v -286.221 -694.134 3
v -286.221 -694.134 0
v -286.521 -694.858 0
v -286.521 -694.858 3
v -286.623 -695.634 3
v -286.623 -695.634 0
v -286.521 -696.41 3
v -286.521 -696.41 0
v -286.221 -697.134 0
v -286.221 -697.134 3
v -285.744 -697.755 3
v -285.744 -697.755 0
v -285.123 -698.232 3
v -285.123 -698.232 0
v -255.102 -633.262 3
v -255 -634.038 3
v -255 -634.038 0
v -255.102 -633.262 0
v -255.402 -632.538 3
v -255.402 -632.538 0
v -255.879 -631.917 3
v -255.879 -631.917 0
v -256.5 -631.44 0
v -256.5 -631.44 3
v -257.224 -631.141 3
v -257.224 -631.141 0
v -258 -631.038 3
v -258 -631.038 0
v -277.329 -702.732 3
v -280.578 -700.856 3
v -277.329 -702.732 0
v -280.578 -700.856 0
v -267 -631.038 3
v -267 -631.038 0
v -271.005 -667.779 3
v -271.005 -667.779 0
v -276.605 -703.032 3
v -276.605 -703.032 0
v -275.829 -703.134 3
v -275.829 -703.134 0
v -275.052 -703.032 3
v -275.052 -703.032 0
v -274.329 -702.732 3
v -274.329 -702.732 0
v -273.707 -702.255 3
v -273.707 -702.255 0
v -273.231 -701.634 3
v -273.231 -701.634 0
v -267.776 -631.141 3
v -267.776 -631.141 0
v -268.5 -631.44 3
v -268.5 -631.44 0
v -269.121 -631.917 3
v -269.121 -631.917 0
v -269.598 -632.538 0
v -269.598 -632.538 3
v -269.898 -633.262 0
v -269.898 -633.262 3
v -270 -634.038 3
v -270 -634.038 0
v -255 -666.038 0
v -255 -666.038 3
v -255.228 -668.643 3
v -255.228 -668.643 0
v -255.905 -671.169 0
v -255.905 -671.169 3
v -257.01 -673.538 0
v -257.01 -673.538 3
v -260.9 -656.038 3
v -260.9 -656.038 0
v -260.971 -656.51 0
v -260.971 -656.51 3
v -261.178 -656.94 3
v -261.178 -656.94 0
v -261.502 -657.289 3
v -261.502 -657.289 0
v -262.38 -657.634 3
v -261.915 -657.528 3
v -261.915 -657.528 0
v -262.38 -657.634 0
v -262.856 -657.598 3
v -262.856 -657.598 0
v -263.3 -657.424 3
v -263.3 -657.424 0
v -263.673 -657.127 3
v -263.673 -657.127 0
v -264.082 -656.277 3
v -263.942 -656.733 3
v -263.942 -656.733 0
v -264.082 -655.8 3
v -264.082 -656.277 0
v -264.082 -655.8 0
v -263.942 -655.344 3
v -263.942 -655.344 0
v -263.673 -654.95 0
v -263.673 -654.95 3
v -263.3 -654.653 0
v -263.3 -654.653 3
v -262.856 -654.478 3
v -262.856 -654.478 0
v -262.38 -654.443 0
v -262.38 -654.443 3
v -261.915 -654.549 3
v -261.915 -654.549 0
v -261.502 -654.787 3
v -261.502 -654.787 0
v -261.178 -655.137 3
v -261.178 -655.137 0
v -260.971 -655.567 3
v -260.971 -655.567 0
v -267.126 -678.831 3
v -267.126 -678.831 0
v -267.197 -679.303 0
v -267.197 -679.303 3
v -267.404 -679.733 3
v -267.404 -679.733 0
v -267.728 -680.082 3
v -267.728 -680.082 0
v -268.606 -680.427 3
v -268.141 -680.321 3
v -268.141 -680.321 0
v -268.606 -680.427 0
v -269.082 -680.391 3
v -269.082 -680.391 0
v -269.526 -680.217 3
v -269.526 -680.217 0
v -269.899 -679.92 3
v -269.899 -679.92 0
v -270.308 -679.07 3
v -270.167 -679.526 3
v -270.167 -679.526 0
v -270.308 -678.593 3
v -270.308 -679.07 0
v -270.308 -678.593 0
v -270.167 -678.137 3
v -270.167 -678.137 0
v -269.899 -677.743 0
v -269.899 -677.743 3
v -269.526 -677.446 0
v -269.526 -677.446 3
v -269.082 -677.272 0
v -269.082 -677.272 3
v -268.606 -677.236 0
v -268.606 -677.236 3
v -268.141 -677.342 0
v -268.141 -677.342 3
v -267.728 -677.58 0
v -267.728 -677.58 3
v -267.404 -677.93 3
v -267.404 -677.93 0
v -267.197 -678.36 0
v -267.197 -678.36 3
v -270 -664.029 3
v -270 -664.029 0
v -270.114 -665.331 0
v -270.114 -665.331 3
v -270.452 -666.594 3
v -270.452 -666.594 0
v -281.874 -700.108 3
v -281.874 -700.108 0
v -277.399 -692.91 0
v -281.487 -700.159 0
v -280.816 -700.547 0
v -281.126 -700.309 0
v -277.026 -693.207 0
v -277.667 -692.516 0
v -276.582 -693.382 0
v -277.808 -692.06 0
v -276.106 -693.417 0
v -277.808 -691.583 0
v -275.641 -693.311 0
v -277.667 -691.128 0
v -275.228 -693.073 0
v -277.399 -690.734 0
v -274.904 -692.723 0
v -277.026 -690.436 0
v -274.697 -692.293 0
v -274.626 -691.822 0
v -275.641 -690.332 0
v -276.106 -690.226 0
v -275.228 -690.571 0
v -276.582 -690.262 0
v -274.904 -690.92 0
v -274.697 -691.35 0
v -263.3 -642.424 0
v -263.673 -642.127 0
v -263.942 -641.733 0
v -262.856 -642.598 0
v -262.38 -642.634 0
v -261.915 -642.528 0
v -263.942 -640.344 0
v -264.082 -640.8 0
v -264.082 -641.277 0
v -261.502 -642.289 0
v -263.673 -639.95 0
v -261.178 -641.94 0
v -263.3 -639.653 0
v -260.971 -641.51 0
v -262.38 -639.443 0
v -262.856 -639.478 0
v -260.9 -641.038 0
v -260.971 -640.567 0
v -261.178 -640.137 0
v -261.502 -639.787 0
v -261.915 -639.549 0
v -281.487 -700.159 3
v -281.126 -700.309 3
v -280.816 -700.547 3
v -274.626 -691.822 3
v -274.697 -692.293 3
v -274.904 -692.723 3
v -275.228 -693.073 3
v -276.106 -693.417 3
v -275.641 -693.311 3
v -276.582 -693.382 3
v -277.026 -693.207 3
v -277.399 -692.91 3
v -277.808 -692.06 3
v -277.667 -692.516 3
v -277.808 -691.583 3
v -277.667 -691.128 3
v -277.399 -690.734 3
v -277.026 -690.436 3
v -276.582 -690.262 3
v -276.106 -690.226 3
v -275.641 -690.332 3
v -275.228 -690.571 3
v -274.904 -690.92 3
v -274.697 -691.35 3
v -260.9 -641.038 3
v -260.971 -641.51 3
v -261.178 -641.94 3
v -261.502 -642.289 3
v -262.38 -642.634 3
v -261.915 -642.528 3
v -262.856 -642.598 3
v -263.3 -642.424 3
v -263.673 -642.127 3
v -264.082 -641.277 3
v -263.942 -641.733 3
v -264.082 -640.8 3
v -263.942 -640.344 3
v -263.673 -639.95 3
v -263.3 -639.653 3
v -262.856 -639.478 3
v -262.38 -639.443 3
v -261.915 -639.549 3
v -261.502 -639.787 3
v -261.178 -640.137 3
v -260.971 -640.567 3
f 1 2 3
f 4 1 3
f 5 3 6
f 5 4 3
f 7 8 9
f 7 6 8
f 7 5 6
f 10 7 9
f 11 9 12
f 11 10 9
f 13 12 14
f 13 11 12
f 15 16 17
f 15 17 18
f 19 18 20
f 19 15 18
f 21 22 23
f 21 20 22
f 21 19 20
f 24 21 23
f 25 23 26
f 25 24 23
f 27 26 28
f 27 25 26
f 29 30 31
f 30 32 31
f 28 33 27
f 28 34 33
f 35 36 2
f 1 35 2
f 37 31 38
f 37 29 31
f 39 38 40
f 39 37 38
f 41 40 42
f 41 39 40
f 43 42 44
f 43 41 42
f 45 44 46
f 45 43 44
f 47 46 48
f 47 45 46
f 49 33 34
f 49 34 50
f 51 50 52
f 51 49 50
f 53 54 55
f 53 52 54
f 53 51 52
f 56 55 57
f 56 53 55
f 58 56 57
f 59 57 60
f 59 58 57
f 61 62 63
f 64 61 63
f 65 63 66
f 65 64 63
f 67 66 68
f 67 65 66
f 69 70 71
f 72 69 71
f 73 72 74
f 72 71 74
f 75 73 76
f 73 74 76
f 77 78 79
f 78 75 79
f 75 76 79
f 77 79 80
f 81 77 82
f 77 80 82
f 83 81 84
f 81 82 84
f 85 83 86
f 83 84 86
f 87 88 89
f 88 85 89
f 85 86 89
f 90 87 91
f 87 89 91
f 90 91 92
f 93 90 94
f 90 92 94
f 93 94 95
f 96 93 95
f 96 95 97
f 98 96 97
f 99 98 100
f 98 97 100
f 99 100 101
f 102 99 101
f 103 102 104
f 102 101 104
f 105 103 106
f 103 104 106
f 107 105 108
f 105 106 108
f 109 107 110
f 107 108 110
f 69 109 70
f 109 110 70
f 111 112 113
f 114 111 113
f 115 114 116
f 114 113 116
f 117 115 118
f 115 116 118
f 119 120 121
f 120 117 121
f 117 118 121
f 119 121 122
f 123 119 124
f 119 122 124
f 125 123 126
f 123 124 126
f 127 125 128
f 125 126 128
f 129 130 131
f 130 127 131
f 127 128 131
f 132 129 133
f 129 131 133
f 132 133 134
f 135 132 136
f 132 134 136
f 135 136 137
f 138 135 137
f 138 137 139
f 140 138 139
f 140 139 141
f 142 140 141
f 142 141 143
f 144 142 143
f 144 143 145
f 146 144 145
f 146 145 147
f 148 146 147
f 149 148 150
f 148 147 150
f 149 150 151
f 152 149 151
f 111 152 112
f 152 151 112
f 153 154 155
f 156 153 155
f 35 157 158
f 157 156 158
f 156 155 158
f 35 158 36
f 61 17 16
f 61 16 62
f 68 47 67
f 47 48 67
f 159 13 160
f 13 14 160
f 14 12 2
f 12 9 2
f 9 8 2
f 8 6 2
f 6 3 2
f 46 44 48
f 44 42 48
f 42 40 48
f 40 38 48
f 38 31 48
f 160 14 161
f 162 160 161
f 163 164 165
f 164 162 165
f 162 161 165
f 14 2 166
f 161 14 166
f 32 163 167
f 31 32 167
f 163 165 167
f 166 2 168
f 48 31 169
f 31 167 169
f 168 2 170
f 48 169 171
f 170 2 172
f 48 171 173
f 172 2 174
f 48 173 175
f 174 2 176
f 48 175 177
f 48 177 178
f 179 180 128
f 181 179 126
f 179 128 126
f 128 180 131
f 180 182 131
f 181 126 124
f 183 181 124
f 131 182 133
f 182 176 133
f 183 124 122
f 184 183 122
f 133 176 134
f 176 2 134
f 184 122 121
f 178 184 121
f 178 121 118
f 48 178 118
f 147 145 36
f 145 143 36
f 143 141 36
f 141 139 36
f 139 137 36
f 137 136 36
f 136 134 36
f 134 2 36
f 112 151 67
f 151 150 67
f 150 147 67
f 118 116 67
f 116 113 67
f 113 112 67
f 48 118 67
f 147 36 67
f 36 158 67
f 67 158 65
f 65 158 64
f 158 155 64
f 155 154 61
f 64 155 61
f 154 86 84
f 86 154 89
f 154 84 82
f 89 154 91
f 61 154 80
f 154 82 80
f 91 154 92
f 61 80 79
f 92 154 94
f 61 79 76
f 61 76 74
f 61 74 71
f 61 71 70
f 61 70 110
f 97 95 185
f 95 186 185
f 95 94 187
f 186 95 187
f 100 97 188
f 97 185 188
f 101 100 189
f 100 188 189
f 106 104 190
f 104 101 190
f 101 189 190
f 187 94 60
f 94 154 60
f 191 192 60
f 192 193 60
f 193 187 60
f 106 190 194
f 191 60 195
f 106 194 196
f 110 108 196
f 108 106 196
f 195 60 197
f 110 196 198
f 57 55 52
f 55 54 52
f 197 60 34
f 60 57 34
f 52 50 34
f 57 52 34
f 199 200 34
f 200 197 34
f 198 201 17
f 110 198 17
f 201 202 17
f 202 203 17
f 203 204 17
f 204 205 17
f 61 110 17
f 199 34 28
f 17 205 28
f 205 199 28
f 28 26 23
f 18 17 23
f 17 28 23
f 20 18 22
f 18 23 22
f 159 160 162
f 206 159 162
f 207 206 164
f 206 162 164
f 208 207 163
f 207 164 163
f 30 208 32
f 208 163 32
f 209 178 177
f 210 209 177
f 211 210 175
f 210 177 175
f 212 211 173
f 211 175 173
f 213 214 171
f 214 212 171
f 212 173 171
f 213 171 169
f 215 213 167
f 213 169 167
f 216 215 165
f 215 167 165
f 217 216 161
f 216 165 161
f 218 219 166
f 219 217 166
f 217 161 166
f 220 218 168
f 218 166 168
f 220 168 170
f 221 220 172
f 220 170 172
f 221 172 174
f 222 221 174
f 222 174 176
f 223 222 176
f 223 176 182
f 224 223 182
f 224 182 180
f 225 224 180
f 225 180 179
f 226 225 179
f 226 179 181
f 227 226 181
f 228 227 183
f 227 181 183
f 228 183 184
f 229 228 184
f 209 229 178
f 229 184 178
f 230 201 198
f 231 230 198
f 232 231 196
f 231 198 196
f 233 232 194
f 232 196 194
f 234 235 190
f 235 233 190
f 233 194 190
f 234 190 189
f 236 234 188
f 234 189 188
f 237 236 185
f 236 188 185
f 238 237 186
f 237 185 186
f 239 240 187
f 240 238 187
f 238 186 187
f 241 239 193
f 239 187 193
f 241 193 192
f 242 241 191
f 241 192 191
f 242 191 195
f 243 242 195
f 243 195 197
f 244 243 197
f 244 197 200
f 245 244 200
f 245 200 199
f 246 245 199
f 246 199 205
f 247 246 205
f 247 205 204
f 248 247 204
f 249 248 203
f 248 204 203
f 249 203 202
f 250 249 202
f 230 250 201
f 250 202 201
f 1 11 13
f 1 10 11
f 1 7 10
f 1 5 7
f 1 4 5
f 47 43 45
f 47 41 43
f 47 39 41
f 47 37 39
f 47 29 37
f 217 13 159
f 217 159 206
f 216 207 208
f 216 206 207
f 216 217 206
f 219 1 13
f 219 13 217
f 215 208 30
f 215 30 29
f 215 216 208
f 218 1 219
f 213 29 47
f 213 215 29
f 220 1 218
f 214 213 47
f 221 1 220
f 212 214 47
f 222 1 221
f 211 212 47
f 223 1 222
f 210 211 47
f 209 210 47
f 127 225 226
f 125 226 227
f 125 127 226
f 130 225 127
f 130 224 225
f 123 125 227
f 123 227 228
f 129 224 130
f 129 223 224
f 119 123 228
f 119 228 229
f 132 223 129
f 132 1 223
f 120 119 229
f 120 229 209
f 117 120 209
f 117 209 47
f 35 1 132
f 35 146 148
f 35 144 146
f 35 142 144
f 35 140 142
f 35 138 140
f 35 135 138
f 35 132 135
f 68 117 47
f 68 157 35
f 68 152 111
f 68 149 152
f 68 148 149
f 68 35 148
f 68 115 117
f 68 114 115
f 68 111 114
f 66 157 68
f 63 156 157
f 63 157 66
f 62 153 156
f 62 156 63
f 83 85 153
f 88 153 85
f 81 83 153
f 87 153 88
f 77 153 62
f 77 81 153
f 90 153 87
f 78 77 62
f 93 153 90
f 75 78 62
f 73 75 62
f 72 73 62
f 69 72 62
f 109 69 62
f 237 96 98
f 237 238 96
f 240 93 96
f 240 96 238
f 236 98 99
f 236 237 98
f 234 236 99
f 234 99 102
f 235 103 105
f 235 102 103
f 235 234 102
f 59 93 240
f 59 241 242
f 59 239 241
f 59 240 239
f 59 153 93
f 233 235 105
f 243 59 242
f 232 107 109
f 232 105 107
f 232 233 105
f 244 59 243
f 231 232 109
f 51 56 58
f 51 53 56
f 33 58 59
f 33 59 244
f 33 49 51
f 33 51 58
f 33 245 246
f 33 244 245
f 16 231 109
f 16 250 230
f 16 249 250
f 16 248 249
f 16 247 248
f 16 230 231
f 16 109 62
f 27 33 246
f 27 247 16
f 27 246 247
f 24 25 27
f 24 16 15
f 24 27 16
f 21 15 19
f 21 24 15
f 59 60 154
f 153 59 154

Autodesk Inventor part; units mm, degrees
ref_plane "YZ Plane" through (0, 0, 0) normal (1, 0, 0) x (0, 1, 0)
ref_plane "XZ Plane" through (0, 0, 0) normal (0, 1, 0) x (-1, 0, 0)
ref_plane "XY Plane" through (0, 0, 0) normal (0, 0, 1) x (1, 0, 0)
sketch "スケッチ1" plane through (0, 0, 0) normal (0, 0, 1) x (1, 0, 0)
  line L0 (67.5, 17.5) -> (-67.5, 17.5) construction
  line L1 (-67.5, 17.5) -> (-67.5, -17.5) construction
  line L2 (-67.5, -17.5) -> (67.5, -17.5) construction
  line L3 (67.5, -17.5) -> (67.5, 17.5) construction
  line L4 (67.5, 17.5) -> (-67.5, -17.5) construction
  line L5 (-67.5, 17.5) -> (67.5, -17.5) construction
  circle A0 centre (-60, 35) radius 1.6 construction
  circle A1 centre (-70, 35) radius 1.6 construction
  line L6 (-77.5, 27.5) -> (-53, 27.5) construction
  line L7 (-53, 27.5) -> (-53, 42.5) construction
  line L8 (-53, 42.5) -> (-80, 42.5) construction
  line L9 (-77.5, 27.5) -> (-77.5, -27.5) construction
  line L10 (-77.5, -27.5) -> (-53, -27.5) construction
  line L11 (-53, -27.5) -> (-53, -42.5) construction
  line L12 (-53, -42.5) -> (-80, -42.5) construction
  circle A2 centre (-60, -35) radius 1.6 construction
  circle A3 centre (-70, -35) radius 1.6 construction
  circle A4 centre (-80, -35) radius 1.6 construction
  line L13 (124.2308, -31.7536) -> (484.5935, -392.1164)
  line L14 (484.5935, -392.1164) -> (488.7129, -553.575)
  line L15 (-80, 21.2868) -> (-468.838, -367.5512) construction
  line L16 (-468.838, -367.5512) -> (-479.4446, -356.9446)
  line L17 (-479.4446, -356.9446) -> (-90.6066, 31.8934) construction
  line L18 (-90.6066, 31.8934) -> (-80, 21.2868) construction
  line L19 (-80, 42.5) -> (-80, 5.3052) construction
  circle A5 centre (-92.3744, 19.519) radius 1.6 construction
  circle A6 centre (-102.981, 8.9124) radius 1.6 construction
  circle A7 centre (-113.5876, -1.6942) radius 1.6 construction
  line L20 (-92.3744, 19.519) -> (-113.5876, -1.6942) construction
  circle A8 centre (-437.941, -345.2067) radius 1.6
  circle A9 centre (-426.1402, -333.4059) radius 1.6
  line L21 (-388.4374, -772.2067) -> (-358.1265, -754.7067) construction
  line L22 (-358.1265, -754.7067) -> (-425.6265, -637.7933) construction
  line L23 (-455.9374, -655.2933) -> (-358.1265, -754.7067) construction
  line L24 (-388.4374, -772.2067) -> (-425.6265, -637.7933) construction
  line L25 (-455.9374, -655.2933) -> (-388.4374, -772.2067) construction
  line L26 (-425.6265, -637.7933) -> (-455.9374, -655.2933) construction
  line L27 (455.9374, -655.2933) -> (425.6265, -637.7933) construction
  line L28 (425.6265, -637.7933) -> (358.1265, -754.7067) construction
  line L29 (388.4374, -772.2067) -> (425.6265, -637.7933) construction
  line L30 (455.9374, -655.2933) -> (358.1265, -754.7067) construction
  line L31 (388.4374, -772.2067) -> (455.9374, -655.2933) construction
  line L32 (358.1265, -754.7067) -> (388.4374, -772.2067) construction
  line L33 (0, 0) -> (0, -263.4473) construction
  circle A10 centre (80, -35) radius 1.6 construction
  line L34 (67.5, 17.5) -> (67.5, -17.5) construction
  line L35 (77.5, 27.5) -> (53, 27.5) construction
  line L36 (77.5, 27.5) -> (77.5, -27.5) construction
  line L37 (77.5, -27.5) -> (53, -27.5) construction
  circle A11 centre (60, -35) radius 1.6 construction
  circle A12 centre (70, -35) radius 1.6 construction
  line L38 (53, -27.5) -> (53, -42.5) construction
  line L39 (53, -42.5) -> (80, -42.5) construction
  circle A13 centre (60, 35) radius 1.6 construction
  circle A14 centre (70, 35) radius 1.6 construction
  line L40 (80, 42.5) -> (80, 5.3052) construction
  line L41 (53, 42.5) -> (80, 42.5) construction
  line L42 (53, 27.5) -> (53, 42.5) construction
  line L43 (-392.0976, -785.867) -> (-404.3476, -764.6493)
  line L44 (-388.4374, -772.2067) -> (-358.1265, -754.7067) construction
  line L45 (-392.0976, -785.867) -> (-344.4662, -758.367)
  circle A15 centre (-336.7211, -756.782) radius 1.6
  circle A16 centre (-341.7211, -748.1218) radius 1.6
  line L46 (-343.7259, -729.6493) -> (-330.2259, -753.032)
  circle A17 centre (-346.7211, -739.4615) radius 1.6
  line L47 (-356.7162, -737.1493) -> (-343.7259, -729.6493)
  line L48 (-344.4662, -758.367) -> (-356.7162, -737.1493)
  circle A18 centre (-407.3428, -774.4615) radius 1.6
  circle A19 centre (-402.3428, -783.1218) radius 1.6
  line L49 (-404.3476, -764.6493) -> (-417.338, -772.1493)
  line L50 (-417.338, -772.1493) -> (-405.4634, -792.7168)
  line L51 (-403.838, -795.532) -> (-371.6264, -776.9346) construction
  line L52 (-425.6265, -637.7933) -> (-455.9374, -655.2933) construction
  line L53 (-409.7162, -645.3507) -> (-396.7259, -637.8507)
  circle A20 centre (-406.7211, -635.5385) radius 1.6
  line L54 (-455.9374, -655.2933) -> (-425.6265, -637.7933) construction
  circle A21 centre (-411.7211, -626.8782) radius 1.6
  line L55 (-469.5976, -651.633) -> (-421.9662, -624.133)
  line L56 (-421.9662, -624.133) -> (-409.7162, -645.3507)
  line L57 (-396.7259, -637.8507) -> (-410.2259, -614.468)
  circle A22 centre (-416.7211, -618.218) radius 1.6
  line L58 (-469.5976, -651.633) -> (-457.3476, -672.8507)
  circle A23 centre (-467.3428, -670.5385) radius 1.6
  circle A24 centre (-472.3428, -661.8782) radius 1.6
  line L59 (-483.838, -656.968) -> (-451.6264, -638.3706) construction
  line L60 (-470.338, -680.3507) -> (-483.838, -656.968)
  line L61 (-457.3476, -672.8507) -> (-470.338, -680.3507)
  line L62 (469.5976, -651.633) -> (457.3476, -672.8507)
  line L63 (455.9374, -655.2933) -> (425.6265, -637.7933) construction
  line L64 (469.5976, -651.633) -> (421.9662, -624.133)
  circle A25 centre (416.7211, -618.218) radius 1.6
  circle A26 centre (411.7211, -626.8782) radius 1.6
  line L65 (396.7259, -637.8507) -> (410.2259, -614.468)
  circle A27 centre (406.7211, -635.5385) radius 1.6
  line L66 (409.7162, -645.3507) -> (396.7259, -637.8507)
  line L67 (421.9662, -624.133) -> (409.7162, -645.3507)
  circle A28 centre (467.3428, -670.5385) radius 1.6
  circle A29 centre (472.3428, -661.8782) radius 1.6
  line L68 (457.3476, -672.8507) -> (470.338, -680.3507)
  line L69 (470.338, -680.3507) -> (483.838, -656.968)
  line L70 (483.838, -656.968) -> (451.6264, -638.3706) construction
  line L71 (358.1265, -754.7067) -> (388.4374, -772.2067) construction
  line L72 (356.7162, -737.1493) -> (343.7259, -729.6493)
  circle A30 centre (346.7211, -739.4615) radius 1.6
  line L73 (388.4374, -772.2067) -> (358.1265, -754.7067) construction
  circle A31 centre (341.7211, -748.1218) radius 1.6
  line L74 (392.0976, -785.867) -> (344.4662, -758.367)
  line L75 (344.4662, -758.367) -> (356.7162, -737.1493)
  line L76 (343.7259, -729.6493) -> (330.2259, -753.032)
  circle A32 centre (336.7211, -756.782) radius 1.6
  line L77 (392.0976, -785.867) -> (404.3476, -764.6493)
  circle A33 centre (407.3428, -774.4615) radius 1.6
  circle A34 centre (402.3428, -783.1218) radius 1.6
  line L78 (403.838, -795.532) -> (371.6264, -776.9346) construction
  line L79 (417.338, -772.1493) -> (403.838, -795.532)
  line L80 (404.3476, -764.6493) -> (417.338, -772.1493)
  line L81 (-483.838, -367.5512) -> (-468.838, -367.5512)
  line L82 (-468.838, -367.5512) -> (-468.838, -648.3077) construction
  line L83 (-468.838, -648.3077) -> (-483.838, -648.3077) construction
  line L84 (-483.838, -648.3077) -> (-483.838, -367.5512) construction
  line L85 (-283.2277, -604.4352) -> (-262.2277, -640.8083) construction
  line L86 (345.2492, -497.0108) -> (305.7786, -565.3759) construction
  line L87 (250, -655.004) -> (-250, -655.004) construction
  line L88 (-250, -655.004) -> (-250, -1155.004) construction
  line L89 (-250, -1155.004) -> (250, -1155.004) construction
  line L90 (250, -1155.004) -> (250, -655.004) construction
  line L91 (250, -655.004) -> (-250, -1155.004) construction
  line L92 (-250, -655.004) -> (250, -1155.004) construction
  line L93 (-12.841, -157.5) -> (15.1134, -157.5) construction
  circle A35 centre (-3.0548, -432.807) radius 212.5 construction
  line L94 (496.9452, 30.2659) -> (-503.0548, 30.2659) construction
  line L95 (-503.0548, 30.2659) -> (-503.0548, -969.7341) construction
  line L96 (-503.0548, -969.7341) -> (496.9452, -969.7341) construction
  line L97 (496.9452, -969.7341) -> (496.9452, 30.2659) construction
  line L98 (496.9452, 30.2659) -> (-503.0548, -969.7341) construction
  line L99 (-503.0548, 30.2659) -> (496.9452, -969.7341) construction
  circle A36 centre (-3.0548, -432.807) radius 250 construction
  line L100 (-80, 42.5) -> (-90.6066, 31.8934) construction
  line L101 (-80, 42.5) -> (-118.8909, 3.6091) construction
  line L102 (-118.8909, -6.2904) -> (-113.234, -11.9472) construction
  line L103 (-113.234, -11.9472) -> (-85.3433, -40.263) construction
  arc A37 (-118.8909, 3.6091) -> (-118.8909, -6.2904) centre (-113.9411, -1.3406) ccw construction
  arc A38 (-85.3433, -40.263) -> (-80, -42.5) centre (-80, -35) ccw construction
  line L104 (-80, 42.5) -> (-53, 42.5) construction
  circle A39 centre (-476.338, -638.3077) radius 1.6
  circle A40 centre (-476.338, -623.3077) radius 1.6
  circle A41 centre (-476.338, -608.2553) radius 1.6
  line L105 (-483.838, -656.968) -> (-483.838, -601.2553)
  line L106 (-483.838, -601.2553) -> (-468.838, -601.2553)
  line L107 (-468.838, -601.2553) -> (-415.3976, -610.8357)
  arc A42 (-410.2259, -614.468) -> (-415.3976, -610.8357) centre (-416.7211, -618.218) ccw
  line L108 (-255, -181.8915) -> (-270, -181.8915)
  line L109 (-270, -181.8915) -> (-270, -631.0383) construction
  line L110 (-270, -666.0383) -> (-255, -666.0383) construction
  line L111 (-255, -666.0383) -> (-255, -181.8915) construction
  line L112 (-271.0048, -667.7787) -> (-287.7211, -696.7321)
  line L113 (-426.5432, -937.1791) -> (-415.5605, -943.52)
  line L114 (-257.0096, -673.5383) -> (-270, -666.0383) construction
  line L115 (-325.2259, -761.6923) -> (-338.2162, -769.1923) construction
  circle A43 centre (-325.2259, -776.6923) radius 1.6
  circle A44 centre (-332.7259, -789.6827) radius 1.6
  circle A45 centre (-340.2259, -802.673) radius 1.6
  line L116 (-325.2259, -776.6923) -> (-340.2259, -802.673) construction
  line L117 (-330.2259, -753.032) -> (-318.7307, -772.9423)
  line L118 (-318.7307, -780.4423) -> (-333.7307, -806.423)
  line L119 (-400.6724, -796.2707) -> (-341.93, -809.9769)
  arc A46 (-405.4634, -792.7168) -> (-400.6724, -796.2707) centre (-398.9682, -788.9668) ccw
  arc A47 (-341.93, -809.9769) -> (-333.7307, -806.423) centre (-340.2259, -802.673) ccw
  arc A48 (-318.7307, -780.4423) -> (-318.7307, -772.9423) centre (-325.2259, -776.6923) ccw
  circle A49 centre (-268.7259, -678.8314) radius 1.6
  circle A50 centre (-276.2259, -691.8218) radius 1.6
  line L120 (-268.7259, -678.8314) -> (-283.7259, -704.8122) construction
  circle A51 centre (-262.5, -656.0383) radius 1.6
  circle A52 centre (-262.5, -641.0383) radius 1.6
  line L121 (-270, -631.0383) -> (-255, -631.0383)
  line L122 (-287.7211, -696.7321) -> (-281.8739, -700.1079)
  line L123 (-274.7307, -704.2321) -> (-257.0096, -673.5383)
  line L124 (-255, -631.0383) -> (-255, -666.0383)
  arc A53 (-257.0096, -673.5383) -> (-255, -666.0383) centre (-270, -666.0383) ccw
  line L125 (-270, -631.0383) -> (-270, -664.0287)
  line L126 (-287.7211, -696.7321) -> (-426.5432, -937.1791) construction
  arc A54 (-271.0048, -667.7787) -> (-270, -664.0287) centre (-277.5, -664.0287) ccw
  arc A55 (-280.5778, -700.8562) -> (-281.8739, -700.1079) centre (-281.8759, -701.6079) ccw
  line L127 (-281.8739, -700.1079) -> (-280.5778, -700.8562) construction
  line L128 (-280.5778, -700.8562) -> (-274.7307, -704.2321)
  arc A56 (-282.6259, -702.9069) -> (-280.5778, -700.8562) centre (-281.8759, -701.6079) ccw construction
  arc A57 (-281.8739, -700.1079) -> (-282.6259, -702.9069) centre (-281.8759, -701.6079) ccw construction
  point P0 (-77.5, 0)
  point P1 (0, -470)
  point P2 (-123.8406, -1.3406)
  point P3 (-102.981, 8.9124)
  point P4 (-407.0319, -705)
  point P5 (-407.0319, -705)
  point P6 (407.0319, -705)
  point P7 (407.0319, -705)
  point P8 (77.5, 0)
  point P9 (-368.2819, -772.117)
  point P10 (-385.4668, -784.9254)
  point P11 (-445.7819, -637.883)
  point P12 (445.7819, -637.883)
  point P13 (465.4668, -646.3614)
  point P14 (368.2819, -772.117)
  point P15 (0, -905.004)
  point P16 (-3.0548, -469.7341)
  point P17 (0, -905.004)
  point P18 (-262.5, -666.0383)
  dimension "d4" = 135
  dimension "d5" = 35
  dimension "d6" = 3.2
  dimension "d7" = 3.2
  dimension "d8" = 10
  dimension "d9" = 15
  dimension "d10" = 10
  dimension "d11" = 7.5
  dimension "d12" = 7
  dimension "d13" = 70
  dimension "d14" = 3.2
  dimension "d15" = 3.2
  dimension "d16" = 3.2
  dimension "d17" = 10
  dimension "d18" = 10
  dimension "d19" = 7
  dimension "d20" = 15
  dimension "d21" = 7.5
  dimension "d22" = 10
  dimension "d23" = 10
  dimension "d24" = 135
  dimension "d25" = 15
  dimension "d26" = 10
  dimension "d27" = 3.2
  dimension "d28" = 3.2
  dimension "d29" = 3.2
  dimension "d30" = 10
  dimension "d31" = 15
  dimension "d32" = 15
  dimension "d33" = 7.5
  dimension "d34" = 45
  dimension "d35" = 3.2
  dimension "d36" = 3.2
  dimension "d37" = 360
  dimension "d38" = 360
  dimension "d39" = 470
  dimension "d40" = 15
  dimension "d41" = 200
  dimension "d42" = 200
  dimension "d43" = 500
  dimension "d44" = 500
  dimension "d45" = 200
  dimension "d46" = 425
  dimension "d47" = 1000
  dimension "d48" = 1000
  dimension "d49" = 42
  dimension "d50" = 500
  dimension "d51" = 7
  dimension "d52" = 7
  dimension "d53" = 3.2
  dimension "d54" = 3.2
  dimension "d55" = 3.2
  dimension "d56" = 15
  dimension "d57" = 15.0524
  dimension "d58" = 7.5
  dimension "d59" = 10
  dimension "d60" = 7
  dimension "d61" = 15
  dimension "d62" = 5
  dimension "d63" = 150
  dimension "d64" = 10
  dimension "d65" = 15
  dimension "d66" = 3.2
  dimension "d67" = 3.2
extrude "押し出し1" add sketch "スケッチ1" along normal blind 3 contours A54 L125 L121 L124 A53 L123 L128 A55 L122 L112
fillet "フィレット1" radius 3 4 edges at (-270, -631.0383, 1.5) (-255, -631.0383, 1.5) (-287.7211, -696.7321, 1.5) (-274.7307, -704.2321, 1.5)
properties part number "オムニ_固定具2" material "アルミニウム 6061"
